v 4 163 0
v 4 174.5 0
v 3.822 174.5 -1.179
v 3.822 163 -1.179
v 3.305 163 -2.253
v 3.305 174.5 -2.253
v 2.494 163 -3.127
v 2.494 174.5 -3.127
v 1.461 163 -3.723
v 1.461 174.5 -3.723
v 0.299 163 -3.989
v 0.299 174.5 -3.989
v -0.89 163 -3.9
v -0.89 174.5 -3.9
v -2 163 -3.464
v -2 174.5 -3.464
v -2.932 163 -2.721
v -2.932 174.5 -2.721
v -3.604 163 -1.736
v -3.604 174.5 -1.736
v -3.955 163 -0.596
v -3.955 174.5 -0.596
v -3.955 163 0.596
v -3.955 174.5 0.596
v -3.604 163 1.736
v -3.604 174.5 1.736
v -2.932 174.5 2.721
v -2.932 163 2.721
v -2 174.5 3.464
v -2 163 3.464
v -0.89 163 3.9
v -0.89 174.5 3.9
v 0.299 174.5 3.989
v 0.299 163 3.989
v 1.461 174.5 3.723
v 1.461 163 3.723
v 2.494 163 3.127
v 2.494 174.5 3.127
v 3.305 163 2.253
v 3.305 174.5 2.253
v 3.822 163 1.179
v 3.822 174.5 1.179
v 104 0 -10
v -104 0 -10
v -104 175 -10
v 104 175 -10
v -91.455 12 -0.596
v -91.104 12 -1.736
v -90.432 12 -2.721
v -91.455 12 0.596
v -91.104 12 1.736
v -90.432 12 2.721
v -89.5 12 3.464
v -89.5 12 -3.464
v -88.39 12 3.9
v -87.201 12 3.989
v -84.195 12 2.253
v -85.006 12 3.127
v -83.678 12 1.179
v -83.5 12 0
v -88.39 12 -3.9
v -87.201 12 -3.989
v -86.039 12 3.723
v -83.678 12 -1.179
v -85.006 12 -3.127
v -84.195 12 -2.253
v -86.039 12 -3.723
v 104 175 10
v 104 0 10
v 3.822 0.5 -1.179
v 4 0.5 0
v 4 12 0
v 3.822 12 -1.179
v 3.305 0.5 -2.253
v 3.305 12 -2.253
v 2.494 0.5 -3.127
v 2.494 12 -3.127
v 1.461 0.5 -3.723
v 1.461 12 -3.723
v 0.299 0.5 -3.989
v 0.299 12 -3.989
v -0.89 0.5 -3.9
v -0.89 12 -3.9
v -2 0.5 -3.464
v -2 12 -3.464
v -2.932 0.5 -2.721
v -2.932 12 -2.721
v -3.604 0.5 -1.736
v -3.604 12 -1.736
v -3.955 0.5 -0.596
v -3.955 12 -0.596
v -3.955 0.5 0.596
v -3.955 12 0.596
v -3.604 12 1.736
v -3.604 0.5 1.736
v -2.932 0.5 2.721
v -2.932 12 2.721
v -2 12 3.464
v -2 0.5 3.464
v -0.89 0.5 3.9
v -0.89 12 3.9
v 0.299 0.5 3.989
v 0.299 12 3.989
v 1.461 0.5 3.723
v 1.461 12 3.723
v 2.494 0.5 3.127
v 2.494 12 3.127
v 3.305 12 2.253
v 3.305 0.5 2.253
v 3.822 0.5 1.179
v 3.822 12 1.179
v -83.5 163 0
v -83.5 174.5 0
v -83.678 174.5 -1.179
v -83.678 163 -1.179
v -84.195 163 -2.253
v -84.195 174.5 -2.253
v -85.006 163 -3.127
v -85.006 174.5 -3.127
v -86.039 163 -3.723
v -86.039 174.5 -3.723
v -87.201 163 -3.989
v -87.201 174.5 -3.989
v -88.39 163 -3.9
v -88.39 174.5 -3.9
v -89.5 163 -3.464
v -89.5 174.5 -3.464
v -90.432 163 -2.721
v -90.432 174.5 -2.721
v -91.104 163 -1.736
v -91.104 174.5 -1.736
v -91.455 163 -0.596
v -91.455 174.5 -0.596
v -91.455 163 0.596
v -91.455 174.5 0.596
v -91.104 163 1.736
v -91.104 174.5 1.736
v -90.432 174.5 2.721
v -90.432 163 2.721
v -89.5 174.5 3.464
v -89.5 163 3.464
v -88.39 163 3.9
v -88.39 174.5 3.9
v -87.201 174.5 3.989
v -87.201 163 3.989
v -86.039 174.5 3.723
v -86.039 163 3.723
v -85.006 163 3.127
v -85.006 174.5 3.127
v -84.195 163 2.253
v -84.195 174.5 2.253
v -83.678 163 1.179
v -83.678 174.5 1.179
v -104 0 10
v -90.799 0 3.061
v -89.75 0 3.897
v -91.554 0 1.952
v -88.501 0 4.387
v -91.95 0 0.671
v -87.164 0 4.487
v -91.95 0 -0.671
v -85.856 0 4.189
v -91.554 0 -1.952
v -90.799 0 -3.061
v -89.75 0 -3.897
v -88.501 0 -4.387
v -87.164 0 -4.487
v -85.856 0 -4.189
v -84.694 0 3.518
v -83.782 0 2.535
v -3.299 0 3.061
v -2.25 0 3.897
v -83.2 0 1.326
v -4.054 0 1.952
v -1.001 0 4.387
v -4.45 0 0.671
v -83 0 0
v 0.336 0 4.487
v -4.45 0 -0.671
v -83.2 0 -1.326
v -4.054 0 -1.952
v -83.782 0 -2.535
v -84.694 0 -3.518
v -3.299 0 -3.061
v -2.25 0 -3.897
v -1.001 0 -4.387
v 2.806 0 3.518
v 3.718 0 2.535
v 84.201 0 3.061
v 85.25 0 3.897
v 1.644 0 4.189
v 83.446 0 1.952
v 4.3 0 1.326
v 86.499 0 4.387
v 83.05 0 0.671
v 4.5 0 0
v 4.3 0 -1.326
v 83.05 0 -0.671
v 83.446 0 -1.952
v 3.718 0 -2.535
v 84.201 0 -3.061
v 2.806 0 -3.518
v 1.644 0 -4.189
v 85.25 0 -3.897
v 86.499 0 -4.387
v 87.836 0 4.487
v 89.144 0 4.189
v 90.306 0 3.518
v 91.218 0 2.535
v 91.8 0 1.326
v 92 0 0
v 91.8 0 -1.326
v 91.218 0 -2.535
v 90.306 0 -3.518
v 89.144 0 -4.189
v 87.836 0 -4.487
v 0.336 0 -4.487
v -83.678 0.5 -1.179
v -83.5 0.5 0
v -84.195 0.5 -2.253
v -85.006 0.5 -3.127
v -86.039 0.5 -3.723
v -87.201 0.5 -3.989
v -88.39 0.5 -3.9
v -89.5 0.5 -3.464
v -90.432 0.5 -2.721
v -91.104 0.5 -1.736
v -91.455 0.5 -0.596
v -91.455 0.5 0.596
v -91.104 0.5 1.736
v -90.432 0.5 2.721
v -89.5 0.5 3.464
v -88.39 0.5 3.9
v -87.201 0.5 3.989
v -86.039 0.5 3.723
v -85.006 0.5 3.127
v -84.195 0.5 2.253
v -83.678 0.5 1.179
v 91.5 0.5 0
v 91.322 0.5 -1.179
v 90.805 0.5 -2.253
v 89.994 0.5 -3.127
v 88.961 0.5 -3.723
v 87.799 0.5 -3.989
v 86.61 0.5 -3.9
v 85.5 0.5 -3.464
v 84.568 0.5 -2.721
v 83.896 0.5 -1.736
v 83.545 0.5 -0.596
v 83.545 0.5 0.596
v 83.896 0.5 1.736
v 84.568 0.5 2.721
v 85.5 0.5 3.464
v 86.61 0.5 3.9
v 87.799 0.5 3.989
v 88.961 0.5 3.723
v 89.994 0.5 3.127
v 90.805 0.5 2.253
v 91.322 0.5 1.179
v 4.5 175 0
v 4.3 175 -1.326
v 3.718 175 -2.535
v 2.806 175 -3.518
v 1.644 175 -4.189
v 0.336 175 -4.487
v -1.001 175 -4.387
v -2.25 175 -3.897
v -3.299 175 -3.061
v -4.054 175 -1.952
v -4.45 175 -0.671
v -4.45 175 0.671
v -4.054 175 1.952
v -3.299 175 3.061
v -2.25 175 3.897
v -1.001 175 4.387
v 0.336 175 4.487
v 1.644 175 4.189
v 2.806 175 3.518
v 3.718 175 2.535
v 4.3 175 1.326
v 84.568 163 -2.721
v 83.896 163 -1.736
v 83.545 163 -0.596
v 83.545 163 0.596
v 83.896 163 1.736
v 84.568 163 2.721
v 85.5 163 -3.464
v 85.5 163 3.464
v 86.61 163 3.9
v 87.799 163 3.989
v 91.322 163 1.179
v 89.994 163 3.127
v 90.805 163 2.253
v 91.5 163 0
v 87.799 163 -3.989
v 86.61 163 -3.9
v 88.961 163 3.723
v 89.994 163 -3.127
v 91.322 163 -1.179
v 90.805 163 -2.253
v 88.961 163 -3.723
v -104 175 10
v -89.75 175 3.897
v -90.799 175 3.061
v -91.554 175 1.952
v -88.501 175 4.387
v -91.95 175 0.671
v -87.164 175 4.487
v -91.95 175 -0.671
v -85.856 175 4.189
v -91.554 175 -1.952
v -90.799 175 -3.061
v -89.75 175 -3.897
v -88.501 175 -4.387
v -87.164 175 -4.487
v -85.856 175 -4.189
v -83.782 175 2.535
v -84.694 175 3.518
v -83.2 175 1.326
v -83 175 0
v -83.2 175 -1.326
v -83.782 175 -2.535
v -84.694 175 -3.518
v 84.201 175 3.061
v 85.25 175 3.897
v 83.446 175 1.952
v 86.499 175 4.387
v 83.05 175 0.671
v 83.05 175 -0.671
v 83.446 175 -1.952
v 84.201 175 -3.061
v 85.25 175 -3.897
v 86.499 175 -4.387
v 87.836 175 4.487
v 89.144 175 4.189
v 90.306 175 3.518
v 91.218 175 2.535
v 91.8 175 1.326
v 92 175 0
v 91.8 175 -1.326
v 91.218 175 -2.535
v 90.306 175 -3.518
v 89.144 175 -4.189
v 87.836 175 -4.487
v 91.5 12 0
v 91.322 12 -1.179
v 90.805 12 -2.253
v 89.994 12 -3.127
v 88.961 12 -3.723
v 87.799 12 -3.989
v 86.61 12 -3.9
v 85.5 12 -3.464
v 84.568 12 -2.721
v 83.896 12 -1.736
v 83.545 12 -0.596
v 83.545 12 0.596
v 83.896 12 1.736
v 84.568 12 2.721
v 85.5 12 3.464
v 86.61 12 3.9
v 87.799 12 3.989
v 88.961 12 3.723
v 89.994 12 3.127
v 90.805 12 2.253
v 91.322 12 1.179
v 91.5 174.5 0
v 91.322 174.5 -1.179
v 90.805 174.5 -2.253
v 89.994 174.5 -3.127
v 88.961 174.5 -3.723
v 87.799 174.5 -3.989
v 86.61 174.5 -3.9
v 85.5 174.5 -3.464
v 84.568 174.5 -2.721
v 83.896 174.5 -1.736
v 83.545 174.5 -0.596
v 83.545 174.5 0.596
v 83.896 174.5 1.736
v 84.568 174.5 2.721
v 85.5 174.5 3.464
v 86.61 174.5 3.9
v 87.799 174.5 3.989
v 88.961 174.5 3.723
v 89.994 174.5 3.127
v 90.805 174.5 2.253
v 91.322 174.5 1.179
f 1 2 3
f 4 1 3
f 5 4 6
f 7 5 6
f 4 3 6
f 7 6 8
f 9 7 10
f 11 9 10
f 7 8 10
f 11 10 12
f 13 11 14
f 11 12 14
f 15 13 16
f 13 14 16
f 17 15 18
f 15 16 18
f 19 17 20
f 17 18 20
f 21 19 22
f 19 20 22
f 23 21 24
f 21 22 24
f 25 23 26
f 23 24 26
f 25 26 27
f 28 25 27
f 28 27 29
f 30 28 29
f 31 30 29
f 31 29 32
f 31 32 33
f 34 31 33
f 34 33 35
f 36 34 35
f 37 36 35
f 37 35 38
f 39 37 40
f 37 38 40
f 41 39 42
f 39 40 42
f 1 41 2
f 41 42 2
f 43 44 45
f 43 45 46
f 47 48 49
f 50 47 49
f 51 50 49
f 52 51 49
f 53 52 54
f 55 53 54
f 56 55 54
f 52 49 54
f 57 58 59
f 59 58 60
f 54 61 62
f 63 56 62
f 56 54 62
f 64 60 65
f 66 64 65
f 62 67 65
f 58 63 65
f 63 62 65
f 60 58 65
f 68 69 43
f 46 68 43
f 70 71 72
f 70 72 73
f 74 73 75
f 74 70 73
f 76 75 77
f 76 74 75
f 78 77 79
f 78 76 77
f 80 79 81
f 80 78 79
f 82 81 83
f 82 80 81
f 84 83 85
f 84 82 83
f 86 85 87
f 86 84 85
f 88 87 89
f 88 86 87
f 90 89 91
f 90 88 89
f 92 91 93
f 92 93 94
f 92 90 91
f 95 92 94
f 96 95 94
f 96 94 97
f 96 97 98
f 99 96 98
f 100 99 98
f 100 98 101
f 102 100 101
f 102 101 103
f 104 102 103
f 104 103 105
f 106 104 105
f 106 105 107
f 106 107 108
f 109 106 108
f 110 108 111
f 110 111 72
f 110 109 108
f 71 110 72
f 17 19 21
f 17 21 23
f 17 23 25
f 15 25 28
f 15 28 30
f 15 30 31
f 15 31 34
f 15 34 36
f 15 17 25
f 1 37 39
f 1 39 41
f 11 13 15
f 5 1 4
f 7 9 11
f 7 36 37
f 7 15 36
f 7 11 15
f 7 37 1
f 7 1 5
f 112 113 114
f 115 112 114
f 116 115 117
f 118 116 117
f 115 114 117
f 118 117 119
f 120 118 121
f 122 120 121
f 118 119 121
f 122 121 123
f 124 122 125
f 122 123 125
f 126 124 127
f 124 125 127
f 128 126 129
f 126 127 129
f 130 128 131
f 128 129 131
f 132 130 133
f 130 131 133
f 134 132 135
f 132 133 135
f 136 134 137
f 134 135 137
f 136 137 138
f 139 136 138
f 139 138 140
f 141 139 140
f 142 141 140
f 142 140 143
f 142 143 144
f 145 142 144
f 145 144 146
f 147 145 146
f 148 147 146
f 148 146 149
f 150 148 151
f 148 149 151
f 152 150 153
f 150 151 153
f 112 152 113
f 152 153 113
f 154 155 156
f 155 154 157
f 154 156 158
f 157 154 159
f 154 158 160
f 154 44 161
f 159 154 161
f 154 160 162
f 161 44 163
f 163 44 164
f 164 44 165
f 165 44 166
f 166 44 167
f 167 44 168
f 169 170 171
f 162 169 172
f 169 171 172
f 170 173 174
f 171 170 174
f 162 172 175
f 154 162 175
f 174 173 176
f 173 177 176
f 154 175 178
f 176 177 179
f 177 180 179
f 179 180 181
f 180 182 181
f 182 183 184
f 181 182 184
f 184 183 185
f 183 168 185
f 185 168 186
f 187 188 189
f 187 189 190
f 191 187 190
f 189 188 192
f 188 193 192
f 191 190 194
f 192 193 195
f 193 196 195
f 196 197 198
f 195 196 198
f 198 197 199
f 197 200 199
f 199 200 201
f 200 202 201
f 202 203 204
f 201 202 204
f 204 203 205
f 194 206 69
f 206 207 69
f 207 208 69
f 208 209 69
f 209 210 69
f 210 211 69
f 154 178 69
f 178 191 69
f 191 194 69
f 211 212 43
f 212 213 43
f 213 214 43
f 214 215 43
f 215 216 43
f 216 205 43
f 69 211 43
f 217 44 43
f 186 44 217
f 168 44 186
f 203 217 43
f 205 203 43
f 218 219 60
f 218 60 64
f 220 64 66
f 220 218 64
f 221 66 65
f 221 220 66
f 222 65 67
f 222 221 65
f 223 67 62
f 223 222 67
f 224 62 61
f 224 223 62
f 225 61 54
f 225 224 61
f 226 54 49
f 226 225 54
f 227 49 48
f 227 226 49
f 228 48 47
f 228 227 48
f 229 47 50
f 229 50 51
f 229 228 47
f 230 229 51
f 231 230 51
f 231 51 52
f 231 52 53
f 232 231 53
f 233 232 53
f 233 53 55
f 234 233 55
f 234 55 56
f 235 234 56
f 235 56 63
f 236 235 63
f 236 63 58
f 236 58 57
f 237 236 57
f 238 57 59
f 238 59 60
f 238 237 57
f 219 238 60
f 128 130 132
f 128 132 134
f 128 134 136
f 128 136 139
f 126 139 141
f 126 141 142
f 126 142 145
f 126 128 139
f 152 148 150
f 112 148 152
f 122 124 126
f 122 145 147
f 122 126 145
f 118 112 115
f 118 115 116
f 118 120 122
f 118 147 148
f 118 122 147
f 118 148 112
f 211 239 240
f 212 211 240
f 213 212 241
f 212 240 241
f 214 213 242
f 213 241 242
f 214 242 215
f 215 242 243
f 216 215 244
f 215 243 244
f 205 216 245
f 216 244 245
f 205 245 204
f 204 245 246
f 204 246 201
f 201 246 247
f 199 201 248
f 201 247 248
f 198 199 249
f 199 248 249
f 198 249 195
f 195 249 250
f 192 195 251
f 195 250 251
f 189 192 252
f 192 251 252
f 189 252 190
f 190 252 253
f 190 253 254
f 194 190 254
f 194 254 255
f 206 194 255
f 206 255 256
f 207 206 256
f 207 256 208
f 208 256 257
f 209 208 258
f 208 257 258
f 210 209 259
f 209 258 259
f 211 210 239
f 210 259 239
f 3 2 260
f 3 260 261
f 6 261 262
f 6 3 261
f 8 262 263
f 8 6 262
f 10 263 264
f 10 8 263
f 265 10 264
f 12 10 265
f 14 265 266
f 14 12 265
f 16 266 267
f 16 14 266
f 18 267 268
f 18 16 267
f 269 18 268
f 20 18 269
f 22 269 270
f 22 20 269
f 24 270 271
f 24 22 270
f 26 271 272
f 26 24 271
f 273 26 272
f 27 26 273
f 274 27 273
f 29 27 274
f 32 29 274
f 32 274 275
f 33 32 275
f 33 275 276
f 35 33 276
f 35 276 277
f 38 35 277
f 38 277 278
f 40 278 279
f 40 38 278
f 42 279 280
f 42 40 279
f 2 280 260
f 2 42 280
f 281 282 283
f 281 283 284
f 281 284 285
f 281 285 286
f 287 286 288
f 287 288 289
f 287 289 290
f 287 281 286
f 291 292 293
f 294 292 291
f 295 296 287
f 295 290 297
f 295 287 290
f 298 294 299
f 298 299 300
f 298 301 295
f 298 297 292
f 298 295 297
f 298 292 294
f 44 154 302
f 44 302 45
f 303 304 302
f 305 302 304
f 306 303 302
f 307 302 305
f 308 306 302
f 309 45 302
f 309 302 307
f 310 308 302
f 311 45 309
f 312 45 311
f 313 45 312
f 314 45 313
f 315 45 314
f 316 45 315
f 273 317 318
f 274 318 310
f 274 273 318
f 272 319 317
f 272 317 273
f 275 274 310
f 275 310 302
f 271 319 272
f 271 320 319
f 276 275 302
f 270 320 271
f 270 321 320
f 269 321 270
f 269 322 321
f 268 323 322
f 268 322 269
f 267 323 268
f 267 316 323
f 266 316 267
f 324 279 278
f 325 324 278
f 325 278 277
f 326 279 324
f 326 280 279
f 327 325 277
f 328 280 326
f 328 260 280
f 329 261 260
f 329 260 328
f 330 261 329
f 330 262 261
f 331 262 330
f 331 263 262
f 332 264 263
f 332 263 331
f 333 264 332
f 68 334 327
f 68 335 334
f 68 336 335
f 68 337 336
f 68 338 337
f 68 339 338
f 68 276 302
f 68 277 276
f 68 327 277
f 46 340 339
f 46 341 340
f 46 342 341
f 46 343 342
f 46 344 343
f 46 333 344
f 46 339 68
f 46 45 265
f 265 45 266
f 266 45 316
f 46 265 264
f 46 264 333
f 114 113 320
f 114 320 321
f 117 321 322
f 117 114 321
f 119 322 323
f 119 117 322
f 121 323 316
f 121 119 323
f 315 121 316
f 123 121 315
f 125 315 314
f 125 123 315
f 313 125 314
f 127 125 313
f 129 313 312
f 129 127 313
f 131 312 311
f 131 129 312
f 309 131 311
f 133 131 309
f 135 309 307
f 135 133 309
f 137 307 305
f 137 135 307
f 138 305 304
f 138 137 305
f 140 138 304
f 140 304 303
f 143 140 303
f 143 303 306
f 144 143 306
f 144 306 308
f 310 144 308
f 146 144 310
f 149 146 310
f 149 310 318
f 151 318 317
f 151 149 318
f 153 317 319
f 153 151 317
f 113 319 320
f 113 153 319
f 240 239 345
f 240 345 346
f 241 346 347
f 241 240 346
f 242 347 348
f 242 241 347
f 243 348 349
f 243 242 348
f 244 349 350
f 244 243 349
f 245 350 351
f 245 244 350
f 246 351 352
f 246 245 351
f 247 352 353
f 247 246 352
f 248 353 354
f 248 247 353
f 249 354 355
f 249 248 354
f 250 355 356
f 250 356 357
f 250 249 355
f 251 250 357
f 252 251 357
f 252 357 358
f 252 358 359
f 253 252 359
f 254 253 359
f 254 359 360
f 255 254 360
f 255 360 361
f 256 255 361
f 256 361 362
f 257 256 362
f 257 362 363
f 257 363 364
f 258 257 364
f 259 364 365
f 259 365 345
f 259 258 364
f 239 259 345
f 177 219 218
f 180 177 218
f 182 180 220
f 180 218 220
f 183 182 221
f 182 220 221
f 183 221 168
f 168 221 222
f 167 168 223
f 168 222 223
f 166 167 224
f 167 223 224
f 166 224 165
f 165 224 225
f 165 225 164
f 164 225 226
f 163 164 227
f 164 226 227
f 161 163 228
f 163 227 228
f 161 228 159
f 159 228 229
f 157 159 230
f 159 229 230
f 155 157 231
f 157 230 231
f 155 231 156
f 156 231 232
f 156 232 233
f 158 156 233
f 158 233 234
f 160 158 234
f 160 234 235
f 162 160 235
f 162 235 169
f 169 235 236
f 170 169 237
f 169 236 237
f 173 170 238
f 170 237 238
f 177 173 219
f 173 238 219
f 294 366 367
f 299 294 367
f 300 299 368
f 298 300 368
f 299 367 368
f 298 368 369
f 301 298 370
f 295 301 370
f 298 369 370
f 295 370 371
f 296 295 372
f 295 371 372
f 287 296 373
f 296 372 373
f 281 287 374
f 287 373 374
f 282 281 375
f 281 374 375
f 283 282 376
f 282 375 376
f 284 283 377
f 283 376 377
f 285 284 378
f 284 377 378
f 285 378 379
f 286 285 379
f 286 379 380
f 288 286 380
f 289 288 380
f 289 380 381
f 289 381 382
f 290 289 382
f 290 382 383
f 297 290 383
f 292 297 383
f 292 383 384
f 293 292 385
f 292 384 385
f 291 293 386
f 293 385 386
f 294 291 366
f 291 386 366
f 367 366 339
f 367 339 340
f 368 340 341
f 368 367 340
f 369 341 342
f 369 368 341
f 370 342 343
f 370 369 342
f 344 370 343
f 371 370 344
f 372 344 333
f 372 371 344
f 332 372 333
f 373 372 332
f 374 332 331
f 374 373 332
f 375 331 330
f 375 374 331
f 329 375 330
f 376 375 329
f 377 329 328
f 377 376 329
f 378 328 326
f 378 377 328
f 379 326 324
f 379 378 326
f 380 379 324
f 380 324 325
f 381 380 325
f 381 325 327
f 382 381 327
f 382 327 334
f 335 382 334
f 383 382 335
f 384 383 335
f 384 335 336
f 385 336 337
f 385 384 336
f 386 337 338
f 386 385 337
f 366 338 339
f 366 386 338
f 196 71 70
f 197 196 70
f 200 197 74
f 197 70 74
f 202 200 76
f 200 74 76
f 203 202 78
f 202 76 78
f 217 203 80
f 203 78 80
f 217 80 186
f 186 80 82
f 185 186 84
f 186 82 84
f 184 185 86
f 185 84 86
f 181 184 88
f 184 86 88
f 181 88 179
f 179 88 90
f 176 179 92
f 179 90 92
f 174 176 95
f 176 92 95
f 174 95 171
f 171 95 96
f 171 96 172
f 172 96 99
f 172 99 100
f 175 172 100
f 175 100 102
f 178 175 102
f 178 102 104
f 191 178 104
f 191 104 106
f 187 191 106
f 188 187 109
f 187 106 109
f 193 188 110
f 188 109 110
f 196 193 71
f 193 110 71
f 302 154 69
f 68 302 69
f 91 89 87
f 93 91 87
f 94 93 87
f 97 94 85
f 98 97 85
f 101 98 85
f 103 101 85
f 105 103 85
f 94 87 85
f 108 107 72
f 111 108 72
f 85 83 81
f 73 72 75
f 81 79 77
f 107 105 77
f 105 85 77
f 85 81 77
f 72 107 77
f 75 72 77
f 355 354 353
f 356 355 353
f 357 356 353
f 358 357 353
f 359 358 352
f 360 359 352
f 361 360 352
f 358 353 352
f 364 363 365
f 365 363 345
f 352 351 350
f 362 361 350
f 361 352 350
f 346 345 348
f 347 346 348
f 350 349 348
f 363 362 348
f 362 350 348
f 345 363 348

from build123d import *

# Parameters (mm, degrees)
SKETCH1_W           = 208
SKETCH1_H           = 20
BOSS_EXTRUDE1_DEPTH = 175
SKETCH2_R           = 4
CUT_EXTRUDE1_DEPTH  = 12
CHAMFER1_SIZE       = 0.5


with BuildPart() as part:
    # Sketch1 → Boss-Extrude1 (new body)
    with BuildSketch(Plane(origin=(0, 0, -58), x_dir=(1, 0, 0), z_dir=(0, 1, 0))):
        with Locations((0, -58)):
            Rectangle(SKETCH1_W, SKETCH1_H)
    extrude(amount=BOSS_EXTRUDE1_DEPTH)

    # Sketch2 → Cut-Extrude1 (cut)
    with BuildSketch(Plane(origin=(0, 175, 0), x_dir=(1, 0, 0), z_dir=(0, 1, 0))):
        Circle(SKETCH2_R)
        with Locations((-87.5, 0)):
            Circle(SKETCH2_R)
        with Locations((87.5, 0)):
            Circle(SKETCH2_R)
    cut_extrude1 = extrude(amount=-CUT_EXTRUDE1_DEPTH, mode=Mode.SUBTRACT)

    # Mirror6: Cut-Extrude1 across plane
    add(cut_extrude1.mirror(Plane.ZX.offset(87.5)), mode=Mode.SUBTRACT)

    # Chamfer1
    chamfer1_edges = [part.edges().sort_by_distance(p)[0] for p in [
        (83.5, 175, 0),
        (-91.5, 175, 0),
        (-4, 175, 0),
        (83.5, 0, 0),
        (-91.5, 0, 0),
        (-4, 0, 0),
    ]]
    chamfer(chamfer1_edges, length=CHAMFER1_SIZE)


solid = part.part
